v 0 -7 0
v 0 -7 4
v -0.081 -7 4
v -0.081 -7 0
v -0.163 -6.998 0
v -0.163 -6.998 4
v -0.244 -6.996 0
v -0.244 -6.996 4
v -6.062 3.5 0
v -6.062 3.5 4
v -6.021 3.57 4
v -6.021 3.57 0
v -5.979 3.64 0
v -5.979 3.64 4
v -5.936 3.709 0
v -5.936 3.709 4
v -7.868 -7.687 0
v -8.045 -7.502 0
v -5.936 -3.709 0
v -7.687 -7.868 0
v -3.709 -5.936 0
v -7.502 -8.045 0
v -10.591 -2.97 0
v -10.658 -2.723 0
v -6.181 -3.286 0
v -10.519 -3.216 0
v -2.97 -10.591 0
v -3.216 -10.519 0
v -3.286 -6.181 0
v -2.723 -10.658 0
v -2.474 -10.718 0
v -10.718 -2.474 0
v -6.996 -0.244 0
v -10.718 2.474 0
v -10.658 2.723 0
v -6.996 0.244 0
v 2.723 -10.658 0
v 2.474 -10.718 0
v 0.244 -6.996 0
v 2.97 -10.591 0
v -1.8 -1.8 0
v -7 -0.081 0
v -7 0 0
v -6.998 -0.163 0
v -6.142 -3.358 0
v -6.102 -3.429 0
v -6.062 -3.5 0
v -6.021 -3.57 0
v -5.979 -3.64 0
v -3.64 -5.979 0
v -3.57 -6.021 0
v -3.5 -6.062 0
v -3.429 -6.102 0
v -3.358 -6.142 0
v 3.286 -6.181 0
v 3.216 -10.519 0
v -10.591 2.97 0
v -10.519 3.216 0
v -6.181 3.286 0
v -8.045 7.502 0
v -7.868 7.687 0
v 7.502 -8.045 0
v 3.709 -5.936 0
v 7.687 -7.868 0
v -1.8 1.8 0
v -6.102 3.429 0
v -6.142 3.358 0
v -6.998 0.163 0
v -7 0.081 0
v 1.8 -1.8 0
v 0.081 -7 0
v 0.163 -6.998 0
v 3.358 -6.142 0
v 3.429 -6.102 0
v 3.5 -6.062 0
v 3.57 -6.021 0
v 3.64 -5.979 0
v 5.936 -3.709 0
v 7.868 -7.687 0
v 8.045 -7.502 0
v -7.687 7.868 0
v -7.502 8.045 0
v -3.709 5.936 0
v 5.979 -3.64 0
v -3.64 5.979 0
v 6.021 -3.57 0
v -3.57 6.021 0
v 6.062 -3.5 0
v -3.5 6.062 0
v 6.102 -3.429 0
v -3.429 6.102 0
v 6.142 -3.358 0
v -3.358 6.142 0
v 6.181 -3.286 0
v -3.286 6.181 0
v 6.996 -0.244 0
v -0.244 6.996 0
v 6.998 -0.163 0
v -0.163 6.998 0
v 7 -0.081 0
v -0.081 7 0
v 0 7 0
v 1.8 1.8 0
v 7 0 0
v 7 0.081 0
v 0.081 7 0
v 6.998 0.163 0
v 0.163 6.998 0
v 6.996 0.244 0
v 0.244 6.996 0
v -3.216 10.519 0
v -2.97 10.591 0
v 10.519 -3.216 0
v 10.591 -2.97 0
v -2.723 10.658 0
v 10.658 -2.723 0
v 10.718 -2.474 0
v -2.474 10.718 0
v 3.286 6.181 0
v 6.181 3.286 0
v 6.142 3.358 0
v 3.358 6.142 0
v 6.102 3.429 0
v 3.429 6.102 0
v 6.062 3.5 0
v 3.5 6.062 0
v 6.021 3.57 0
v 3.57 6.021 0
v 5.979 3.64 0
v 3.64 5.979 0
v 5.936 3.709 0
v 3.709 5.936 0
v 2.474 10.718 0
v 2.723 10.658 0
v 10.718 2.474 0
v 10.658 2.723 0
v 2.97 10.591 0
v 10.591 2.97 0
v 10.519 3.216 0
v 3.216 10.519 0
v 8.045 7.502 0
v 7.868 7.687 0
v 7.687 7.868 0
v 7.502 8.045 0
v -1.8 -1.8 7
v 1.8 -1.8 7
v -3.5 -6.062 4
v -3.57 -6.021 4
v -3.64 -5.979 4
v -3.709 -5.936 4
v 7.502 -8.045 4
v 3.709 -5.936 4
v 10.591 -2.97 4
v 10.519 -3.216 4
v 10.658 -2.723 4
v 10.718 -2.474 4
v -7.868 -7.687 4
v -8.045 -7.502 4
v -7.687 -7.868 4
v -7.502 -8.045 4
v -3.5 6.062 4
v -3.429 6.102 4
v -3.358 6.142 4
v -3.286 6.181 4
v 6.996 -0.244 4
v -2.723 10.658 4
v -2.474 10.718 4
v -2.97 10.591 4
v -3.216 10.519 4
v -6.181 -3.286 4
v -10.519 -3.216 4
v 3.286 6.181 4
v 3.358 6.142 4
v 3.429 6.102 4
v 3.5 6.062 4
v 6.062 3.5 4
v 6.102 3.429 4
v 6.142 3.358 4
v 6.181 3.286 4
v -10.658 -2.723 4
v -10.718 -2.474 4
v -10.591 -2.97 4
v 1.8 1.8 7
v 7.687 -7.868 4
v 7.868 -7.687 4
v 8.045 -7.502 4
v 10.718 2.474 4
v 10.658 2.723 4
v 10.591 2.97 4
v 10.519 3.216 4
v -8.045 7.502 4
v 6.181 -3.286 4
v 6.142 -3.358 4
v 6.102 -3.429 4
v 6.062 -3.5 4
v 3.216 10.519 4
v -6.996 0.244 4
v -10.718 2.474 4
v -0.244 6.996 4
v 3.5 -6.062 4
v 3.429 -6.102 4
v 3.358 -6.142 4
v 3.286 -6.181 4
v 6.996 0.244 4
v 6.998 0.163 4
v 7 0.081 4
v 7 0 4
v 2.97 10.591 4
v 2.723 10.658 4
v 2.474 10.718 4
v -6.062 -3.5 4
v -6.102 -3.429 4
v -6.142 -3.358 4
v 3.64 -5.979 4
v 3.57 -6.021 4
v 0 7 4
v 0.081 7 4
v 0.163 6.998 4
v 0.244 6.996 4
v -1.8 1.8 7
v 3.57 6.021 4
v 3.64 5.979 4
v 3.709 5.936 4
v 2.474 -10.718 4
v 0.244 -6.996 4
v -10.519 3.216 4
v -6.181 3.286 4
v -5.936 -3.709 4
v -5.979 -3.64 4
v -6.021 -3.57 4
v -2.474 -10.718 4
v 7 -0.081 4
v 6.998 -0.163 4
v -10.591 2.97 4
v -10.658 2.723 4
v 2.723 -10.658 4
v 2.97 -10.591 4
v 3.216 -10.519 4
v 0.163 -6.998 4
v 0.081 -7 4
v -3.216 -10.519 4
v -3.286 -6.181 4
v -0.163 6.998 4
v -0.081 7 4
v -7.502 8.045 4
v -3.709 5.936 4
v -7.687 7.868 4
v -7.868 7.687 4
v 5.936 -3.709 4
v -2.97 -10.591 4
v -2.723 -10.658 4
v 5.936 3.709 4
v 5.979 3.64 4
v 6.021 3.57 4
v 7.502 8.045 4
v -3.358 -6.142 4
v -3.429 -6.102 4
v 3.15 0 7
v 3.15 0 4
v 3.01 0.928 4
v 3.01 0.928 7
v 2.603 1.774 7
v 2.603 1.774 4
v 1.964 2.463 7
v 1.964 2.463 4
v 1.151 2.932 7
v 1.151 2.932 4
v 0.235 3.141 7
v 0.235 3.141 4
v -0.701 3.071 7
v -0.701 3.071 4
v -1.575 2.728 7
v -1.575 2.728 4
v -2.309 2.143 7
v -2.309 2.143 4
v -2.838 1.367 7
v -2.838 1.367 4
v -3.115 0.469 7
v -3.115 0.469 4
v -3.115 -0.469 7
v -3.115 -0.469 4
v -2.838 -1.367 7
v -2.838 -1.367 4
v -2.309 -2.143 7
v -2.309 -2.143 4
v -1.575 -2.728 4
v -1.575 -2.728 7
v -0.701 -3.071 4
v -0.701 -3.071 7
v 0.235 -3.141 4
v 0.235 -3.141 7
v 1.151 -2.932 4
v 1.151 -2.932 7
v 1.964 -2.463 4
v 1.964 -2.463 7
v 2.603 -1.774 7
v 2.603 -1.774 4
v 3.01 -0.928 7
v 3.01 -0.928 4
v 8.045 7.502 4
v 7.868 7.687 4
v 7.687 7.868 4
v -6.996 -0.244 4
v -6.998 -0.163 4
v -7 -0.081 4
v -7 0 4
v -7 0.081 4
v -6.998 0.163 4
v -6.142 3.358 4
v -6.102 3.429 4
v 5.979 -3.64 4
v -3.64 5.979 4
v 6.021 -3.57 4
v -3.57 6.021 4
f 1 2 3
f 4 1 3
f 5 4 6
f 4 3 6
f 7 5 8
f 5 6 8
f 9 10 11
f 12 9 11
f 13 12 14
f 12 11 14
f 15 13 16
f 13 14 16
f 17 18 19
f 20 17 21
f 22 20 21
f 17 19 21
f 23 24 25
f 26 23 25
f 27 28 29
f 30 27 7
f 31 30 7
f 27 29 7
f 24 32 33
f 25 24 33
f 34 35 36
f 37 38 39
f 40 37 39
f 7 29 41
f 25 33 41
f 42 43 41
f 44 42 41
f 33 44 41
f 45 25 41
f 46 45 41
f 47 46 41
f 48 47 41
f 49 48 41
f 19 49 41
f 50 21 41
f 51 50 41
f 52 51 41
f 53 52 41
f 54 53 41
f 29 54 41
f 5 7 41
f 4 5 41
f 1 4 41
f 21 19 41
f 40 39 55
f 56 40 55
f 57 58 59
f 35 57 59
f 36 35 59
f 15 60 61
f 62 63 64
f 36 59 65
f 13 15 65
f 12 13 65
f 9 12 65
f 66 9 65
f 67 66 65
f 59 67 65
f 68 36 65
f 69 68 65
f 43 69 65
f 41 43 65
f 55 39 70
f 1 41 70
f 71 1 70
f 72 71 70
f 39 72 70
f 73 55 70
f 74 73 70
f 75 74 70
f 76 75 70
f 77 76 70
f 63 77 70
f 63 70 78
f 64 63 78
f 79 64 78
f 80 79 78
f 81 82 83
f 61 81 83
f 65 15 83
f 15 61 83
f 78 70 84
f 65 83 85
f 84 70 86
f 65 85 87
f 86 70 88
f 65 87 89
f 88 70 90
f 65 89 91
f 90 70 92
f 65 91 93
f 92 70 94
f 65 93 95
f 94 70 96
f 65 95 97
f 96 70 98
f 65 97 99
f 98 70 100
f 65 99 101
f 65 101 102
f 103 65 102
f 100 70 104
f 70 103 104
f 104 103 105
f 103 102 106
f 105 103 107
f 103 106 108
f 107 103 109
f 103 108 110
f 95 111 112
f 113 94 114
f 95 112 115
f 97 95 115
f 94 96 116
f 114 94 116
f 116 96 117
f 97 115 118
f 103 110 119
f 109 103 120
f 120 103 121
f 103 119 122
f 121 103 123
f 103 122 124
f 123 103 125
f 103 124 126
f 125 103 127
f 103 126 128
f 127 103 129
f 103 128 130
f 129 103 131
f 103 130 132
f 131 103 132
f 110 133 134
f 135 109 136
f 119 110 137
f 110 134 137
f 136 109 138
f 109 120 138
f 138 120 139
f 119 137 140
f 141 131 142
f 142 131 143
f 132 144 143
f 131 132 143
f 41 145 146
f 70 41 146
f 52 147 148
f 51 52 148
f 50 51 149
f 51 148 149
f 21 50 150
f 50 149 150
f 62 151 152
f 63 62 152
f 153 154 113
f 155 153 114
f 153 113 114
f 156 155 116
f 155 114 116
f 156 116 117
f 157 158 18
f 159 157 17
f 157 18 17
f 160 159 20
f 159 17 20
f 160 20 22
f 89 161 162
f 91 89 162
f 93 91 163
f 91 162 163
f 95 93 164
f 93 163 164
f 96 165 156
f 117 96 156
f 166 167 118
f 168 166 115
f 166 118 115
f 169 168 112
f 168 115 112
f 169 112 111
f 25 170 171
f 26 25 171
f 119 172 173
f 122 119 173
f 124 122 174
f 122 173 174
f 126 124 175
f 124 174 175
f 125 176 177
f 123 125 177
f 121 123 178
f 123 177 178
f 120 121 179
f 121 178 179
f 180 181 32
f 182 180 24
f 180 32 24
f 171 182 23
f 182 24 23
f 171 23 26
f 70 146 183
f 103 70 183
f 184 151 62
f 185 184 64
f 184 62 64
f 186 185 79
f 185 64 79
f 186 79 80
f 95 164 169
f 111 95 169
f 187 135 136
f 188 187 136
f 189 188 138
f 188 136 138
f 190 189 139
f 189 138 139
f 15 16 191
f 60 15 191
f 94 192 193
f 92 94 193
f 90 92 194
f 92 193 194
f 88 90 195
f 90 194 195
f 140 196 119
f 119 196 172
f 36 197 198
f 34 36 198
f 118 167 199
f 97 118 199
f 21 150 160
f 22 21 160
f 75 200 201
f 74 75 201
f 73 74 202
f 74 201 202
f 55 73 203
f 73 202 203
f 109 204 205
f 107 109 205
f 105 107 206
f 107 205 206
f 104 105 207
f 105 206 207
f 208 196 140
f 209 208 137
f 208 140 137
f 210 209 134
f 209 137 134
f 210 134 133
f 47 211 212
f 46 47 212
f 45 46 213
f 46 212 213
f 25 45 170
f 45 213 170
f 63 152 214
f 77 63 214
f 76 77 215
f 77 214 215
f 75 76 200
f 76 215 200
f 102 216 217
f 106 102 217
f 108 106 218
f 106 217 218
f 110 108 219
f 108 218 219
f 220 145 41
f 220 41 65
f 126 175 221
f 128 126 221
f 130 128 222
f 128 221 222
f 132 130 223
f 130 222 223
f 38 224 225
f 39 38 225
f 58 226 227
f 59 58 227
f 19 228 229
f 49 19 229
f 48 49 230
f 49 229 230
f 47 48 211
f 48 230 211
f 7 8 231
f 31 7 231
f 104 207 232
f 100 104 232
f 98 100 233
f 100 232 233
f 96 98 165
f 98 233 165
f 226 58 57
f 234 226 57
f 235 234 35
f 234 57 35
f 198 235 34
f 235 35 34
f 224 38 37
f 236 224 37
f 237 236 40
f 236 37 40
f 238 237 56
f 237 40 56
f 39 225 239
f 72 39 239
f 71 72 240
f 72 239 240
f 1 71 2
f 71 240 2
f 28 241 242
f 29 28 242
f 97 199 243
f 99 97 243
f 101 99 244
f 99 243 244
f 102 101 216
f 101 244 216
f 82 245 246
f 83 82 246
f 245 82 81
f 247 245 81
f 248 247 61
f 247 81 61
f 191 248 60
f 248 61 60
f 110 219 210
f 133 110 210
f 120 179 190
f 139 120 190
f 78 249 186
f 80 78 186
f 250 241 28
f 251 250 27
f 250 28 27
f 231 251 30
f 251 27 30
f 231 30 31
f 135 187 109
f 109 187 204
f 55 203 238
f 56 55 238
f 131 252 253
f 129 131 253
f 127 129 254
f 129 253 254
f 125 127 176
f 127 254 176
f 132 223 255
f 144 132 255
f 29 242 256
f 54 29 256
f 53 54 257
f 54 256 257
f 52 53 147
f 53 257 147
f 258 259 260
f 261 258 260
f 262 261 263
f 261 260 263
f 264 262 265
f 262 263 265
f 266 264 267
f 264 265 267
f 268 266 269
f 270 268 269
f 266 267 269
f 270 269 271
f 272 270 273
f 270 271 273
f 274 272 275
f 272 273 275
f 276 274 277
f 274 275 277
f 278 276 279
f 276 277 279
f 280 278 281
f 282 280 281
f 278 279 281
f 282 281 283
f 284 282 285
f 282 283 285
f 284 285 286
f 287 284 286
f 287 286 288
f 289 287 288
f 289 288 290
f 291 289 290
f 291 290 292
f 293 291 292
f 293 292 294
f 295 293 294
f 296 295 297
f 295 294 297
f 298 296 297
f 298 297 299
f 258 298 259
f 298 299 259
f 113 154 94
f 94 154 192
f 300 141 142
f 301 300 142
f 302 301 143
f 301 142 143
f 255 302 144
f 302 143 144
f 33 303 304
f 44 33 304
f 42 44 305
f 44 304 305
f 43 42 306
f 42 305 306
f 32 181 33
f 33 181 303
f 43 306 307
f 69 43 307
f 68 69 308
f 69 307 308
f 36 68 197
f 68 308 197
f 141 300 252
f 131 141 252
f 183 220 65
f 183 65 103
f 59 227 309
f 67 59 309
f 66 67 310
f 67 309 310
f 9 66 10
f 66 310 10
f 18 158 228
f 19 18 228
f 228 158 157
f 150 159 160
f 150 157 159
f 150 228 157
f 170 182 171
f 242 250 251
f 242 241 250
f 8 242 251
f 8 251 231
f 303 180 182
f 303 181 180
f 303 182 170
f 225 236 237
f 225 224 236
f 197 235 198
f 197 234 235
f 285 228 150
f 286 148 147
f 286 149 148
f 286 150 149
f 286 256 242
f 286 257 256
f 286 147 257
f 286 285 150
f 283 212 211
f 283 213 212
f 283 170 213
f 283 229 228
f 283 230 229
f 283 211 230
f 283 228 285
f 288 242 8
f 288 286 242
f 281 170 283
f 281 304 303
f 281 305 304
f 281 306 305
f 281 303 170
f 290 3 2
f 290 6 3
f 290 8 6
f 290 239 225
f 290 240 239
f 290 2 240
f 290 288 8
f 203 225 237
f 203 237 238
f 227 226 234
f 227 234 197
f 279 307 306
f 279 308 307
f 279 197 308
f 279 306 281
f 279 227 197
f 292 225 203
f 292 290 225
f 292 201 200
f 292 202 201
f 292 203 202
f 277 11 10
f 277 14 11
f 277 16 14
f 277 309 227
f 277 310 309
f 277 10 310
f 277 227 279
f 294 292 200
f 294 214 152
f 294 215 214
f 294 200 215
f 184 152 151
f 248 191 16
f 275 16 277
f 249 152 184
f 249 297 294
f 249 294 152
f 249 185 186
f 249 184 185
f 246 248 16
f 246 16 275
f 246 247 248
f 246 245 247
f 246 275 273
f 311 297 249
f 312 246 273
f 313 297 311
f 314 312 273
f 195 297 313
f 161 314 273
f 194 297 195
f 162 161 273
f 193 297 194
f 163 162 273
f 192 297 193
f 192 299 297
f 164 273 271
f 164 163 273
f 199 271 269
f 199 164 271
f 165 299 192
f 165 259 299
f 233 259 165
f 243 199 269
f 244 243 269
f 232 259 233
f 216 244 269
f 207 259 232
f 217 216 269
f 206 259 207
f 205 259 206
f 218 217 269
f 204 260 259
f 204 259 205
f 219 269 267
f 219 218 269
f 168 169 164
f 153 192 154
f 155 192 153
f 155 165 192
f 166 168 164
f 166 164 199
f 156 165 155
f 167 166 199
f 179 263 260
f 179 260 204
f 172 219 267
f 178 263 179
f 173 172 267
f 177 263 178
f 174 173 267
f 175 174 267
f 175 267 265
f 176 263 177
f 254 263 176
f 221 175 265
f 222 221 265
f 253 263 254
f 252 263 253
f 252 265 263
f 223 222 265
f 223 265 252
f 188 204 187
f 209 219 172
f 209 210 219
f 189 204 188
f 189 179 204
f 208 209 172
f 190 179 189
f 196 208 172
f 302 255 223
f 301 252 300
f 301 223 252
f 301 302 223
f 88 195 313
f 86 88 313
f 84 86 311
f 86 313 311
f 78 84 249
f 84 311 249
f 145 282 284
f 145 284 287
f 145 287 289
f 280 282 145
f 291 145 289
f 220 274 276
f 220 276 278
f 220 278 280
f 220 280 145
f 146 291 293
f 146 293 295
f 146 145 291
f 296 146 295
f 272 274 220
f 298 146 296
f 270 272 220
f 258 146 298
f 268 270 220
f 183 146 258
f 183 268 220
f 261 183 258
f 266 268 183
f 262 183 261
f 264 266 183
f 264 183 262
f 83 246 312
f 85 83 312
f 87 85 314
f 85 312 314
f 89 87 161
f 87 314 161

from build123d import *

# Parameters (mm, degrees)
F0_R            = 11
F1_DEPTH        = 4
F3_DEPTH        = 4.001
F3_COPIES_COUNT = 12
F5_R            = 3.15
F6_DEPTH        = 3
F7_W            = 3.6
F7_H            = 3.6
F8_DEPTH        = 7


# Not quite as in the source:
# - a pattern or mirror of a feature is missing from the dataset's text; its kind, count and spacing are read off the source's solid


with BuildPart() as f1:
    # F0 (on Top) → F1 (new body)
    with BuildSketch(Plane.XY):
        Circle(F0_R)
    extrude(amount=F1_DEPTH)

    # F2 (on face) → F3 (cut, through all)
    with BuildSketch(Plane.XY.offset(4)):
        with BuildLine():
            ThreePointArc((-0.2442964769, 6.9957357891), (-0.1221668451, 6.9989338661), (0, 7))
            Line((0, 7), (0, 11))
            ThreePointArc((0, 11), (-1.2452353514, 10.9292904124), (-2.4744615978, 10.7180707126))
            Line((-2.4744615978, 10.7180707126), (-0.2442964769, 6.9957357891))
        make_face()
        with BuildLine():
            Line((0, 11), (0, 7))
            ThreePointArc((0, 7), (0.1221668451, 6.9989338661), (0.2442964769, 6.9957357891))
            Line((0.2442964769, 6.9957357891), (2.4744615978, 10.7180707126))
            ThreePointArc((2.4744615978, 10.7180707126), (1.2452353514, 10.9292904124), (0, 11))
        make_face()
    f3 = extrude(amount=-F3_DEPTH, mode=Mode.SUBTRACT)

    # F3_copies: F3 ×12 about axis
    f3_copies_axis = Axis((0, 0, 0), (0, 0, 1))
    for i in range(1, F3_COPIES_COUNT):
        add(f3.rotate(f3_copies_axis, i * 360 / F3_COPIES_COUNT), mode=Mode.SUBTRACT)

    # F5 (on face) → F6 (join)
    with BuildSketch(Plane.XY.offset(4)):
        Circle(F5_R)
    extrude(amount=F6_DEPTH)

    # F7 (on face) → F8 (cut, through all)
    with BuildSketch(Plane.XY.offset(7)):
        Rectangle(F7_W, F7_H)
    extrude(amount=-F8_DEPTH, mode=Mode.SUBTRACT)


solid = f1.part
